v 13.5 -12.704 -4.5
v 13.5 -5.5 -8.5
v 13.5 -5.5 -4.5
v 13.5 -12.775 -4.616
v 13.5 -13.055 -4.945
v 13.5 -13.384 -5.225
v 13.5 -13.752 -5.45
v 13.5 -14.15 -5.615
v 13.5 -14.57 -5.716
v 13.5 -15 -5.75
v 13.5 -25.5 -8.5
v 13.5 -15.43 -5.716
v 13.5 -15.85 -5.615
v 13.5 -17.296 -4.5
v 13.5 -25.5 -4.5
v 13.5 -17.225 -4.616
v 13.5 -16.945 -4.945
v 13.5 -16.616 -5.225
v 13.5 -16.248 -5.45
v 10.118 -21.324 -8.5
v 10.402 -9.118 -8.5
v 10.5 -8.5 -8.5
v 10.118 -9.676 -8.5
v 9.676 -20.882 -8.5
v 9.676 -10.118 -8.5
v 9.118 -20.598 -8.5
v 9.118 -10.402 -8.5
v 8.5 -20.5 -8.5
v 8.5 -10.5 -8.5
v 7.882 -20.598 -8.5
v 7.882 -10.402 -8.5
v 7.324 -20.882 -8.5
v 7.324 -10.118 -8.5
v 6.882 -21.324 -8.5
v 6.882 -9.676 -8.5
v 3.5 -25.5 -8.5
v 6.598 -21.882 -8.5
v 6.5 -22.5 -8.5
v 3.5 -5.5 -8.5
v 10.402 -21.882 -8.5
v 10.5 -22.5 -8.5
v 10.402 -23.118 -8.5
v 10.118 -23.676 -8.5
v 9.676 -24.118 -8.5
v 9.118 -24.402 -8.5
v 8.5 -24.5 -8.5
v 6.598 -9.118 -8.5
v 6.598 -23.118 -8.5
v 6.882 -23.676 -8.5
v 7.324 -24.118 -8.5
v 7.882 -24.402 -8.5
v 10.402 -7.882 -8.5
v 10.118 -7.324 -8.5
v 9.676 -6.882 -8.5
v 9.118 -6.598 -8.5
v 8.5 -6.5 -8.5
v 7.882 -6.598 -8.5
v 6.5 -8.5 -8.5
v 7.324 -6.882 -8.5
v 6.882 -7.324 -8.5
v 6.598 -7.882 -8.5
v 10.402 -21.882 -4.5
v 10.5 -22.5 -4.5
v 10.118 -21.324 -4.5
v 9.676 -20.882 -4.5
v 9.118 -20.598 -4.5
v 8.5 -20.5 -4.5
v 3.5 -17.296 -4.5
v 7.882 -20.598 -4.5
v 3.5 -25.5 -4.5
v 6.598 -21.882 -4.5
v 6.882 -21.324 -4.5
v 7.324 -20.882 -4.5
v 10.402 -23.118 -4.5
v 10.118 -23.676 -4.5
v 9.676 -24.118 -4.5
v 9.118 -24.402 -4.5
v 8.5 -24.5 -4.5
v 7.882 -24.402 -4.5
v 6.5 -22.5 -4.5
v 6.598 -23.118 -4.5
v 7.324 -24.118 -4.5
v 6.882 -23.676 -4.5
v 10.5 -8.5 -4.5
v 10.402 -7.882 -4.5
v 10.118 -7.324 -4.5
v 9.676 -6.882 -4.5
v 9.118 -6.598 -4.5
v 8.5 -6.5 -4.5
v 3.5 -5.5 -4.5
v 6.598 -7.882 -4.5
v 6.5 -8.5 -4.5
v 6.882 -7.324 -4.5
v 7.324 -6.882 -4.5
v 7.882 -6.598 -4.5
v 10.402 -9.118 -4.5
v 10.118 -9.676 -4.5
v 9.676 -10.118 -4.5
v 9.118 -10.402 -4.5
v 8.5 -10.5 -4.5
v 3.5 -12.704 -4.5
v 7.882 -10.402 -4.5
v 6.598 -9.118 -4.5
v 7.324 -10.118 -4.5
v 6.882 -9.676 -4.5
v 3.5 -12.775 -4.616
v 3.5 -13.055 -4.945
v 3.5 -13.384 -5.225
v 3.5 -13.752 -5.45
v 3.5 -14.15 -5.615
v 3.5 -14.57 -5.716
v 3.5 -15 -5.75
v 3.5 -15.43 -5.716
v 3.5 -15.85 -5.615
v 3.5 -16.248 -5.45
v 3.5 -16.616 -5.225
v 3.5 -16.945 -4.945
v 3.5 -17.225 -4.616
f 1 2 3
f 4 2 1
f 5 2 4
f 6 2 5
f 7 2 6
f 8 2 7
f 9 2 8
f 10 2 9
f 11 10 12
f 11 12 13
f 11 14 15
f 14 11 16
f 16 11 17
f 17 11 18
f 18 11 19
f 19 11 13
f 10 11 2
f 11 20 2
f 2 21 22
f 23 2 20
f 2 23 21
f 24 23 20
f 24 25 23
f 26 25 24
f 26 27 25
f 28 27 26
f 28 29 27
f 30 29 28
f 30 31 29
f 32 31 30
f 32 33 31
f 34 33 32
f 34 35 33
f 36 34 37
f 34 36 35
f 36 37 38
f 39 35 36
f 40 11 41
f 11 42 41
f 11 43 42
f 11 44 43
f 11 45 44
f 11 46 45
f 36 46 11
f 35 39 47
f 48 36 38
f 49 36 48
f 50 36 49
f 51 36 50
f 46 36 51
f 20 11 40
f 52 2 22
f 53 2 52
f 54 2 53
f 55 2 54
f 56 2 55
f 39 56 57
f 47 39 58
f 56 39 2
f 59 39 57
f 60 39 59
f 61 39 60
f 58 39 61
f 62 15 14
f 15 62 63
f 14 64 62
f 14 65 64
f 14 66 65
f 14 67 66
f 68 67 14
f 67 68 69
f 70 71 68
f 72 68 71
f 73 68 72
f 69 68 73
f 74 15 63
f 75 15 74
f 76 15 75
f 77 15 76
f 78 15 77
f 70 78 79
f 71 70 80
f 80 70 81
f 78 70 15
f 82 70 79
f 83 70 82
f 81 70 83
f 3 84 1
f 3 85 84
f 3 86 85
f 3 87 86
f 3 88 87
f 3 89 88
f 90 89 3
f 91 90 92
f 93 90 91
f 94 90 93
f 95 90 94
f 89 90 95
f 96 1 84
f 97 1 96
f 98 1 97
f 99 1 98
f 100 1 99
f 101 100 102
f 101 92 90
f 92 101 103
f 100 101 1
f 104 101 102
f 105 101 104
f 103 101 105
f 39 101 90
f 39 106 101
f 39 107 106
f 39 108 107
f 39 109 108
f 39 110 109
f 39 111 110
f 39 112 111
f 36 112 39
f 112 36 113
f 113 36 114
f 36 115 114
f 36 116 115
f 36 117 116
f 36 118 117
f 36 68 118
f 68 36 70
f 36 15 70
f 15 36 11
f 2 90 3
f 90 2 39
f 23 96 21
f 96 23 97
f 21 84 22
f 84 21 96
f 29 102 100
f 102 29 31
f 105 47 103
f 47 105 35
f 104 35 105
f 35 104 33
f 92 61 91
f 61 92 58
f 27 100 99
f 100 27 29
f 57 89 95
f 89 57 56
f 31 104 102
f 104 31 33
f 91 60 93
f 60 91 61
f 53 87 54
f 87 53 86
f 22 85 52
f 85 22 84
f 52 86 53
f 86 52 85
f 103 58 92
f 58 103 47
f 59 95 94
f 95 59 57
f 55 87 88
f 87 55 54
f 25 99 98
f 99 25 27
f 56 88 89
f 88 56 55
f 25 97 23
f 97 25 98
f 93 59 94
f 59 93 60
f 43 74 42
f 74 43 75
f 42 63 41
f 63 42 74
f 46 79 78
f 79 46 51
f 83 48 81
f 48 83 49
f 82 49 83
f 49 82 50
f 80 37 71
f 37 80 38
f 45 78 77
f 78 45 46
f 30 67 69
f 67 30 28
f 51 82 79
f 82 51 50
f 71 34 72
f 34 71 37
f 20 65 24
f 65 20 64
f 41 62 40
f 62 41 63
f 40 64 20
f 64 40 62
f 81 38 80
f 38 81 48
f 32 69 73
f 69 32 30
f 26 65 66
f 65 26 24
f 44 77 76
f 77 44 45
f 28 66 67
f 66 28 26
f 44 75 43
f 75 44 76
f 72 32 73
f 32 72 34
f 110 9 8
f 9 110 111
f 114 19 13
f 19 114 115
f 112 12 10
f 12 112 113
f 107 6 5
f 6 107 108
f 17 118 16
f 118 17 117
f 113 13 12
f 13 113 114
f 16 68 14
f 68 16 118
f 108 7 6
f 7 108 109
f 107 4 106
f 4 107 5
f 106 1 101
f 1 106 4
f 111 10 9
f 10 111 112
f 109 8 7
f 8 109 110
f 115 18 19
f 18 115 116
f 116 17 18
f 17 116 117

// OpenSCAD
simple = true;
print = true;
Radius    = 10;
Wandung   = 2.5;
Tolleranz = -1.1;
Hoehe     = 15;
Breite    = 75;
Tiefe     = 30;
Versatz   = Wandung + Tolleranz;
Verschiebung = Wandung/2  ;
Snappos  = 4;
posx = 10;
$fn = 20;




 ViewCase();

module ViewCase()
{
  if (print)
  {
    // rotate([180,0,0]) Oberschale(); 
    rotate([180,0,0]) Kabelklemme();
     //Unterschale();
  }
  else
  {
    difference()
    {
      case();
       //translate([-10,-12,-10]) cube([300,14,100]);   // Schnitt A
       // translate([-20,-10,-10]) cube([45,450,100]);  // Schnitt B
      //translate([-10,-10,9]) cube([300,200,100]);   // Schnitt C 
    }
  }
}  

module case()
{
    Unterschale();
    translate([0,0 ,Snappos]) Oberschale();

}



module Oberschale()
{
  module Gehaeuse(size=[10,10,10])
  {
    aBreite = size[0];
    aTiefe = size[1];
    aSnappos = size[2];
    
    difference()
    {  
    linear_extrude(Hoehe-aSnappos) offset(r = Radius, $fn=40) square([aBreite+Versatz,aTiefe+Versatz]);
     
    translate([Wandung,Wandung,-Wandung]) linear_extrude(Hoehe-(aSnappos)) offset(r = Radius, $fn=20) square([aBreite+Tolleranz-Wandung,aTiefe+Tolleranz-Wandung]);  
      
    translate([Wandung,Wandung,0]) Snapin_B([aBreite+Tolleranz-Wandung,aTiefe+Tolleranz-Wandung,4.5], Feder = 0.8, Tolerance = 0.1, Offset = Radius, $fn=40);
    }
  }
  // translate([12.5,5.6,7.5]) cube([79,65.8,8]); 
   
    difference()
  {  
    union()
    {
      Gehaeuse([Breite, Tiefe, Snappos]);
      translate([Wandung+1,Wandung+posx-7,Wandung+2])  cube([10,20,4]);
    }
    translate([Wandung+6,Wandung+posx-4,Wandung+1])  cylinder(5,1,1);
    translate([Wandung+6,Wandung+posx+10,Wandung+1])  cylinder(5,1,1);
    translate([Verschiebung+Breite-Tiefe/2,Verschiebung+Tiefe/2,Wandung-4])  cylinder(16,3.5,3.5);
  
//  translate([Wandung+0.635*2,Wandung+0.635*1,Wandung+0]) color(    
//    "black") cube([2.54,5.08,7.4]); 
//  translate([Wandung+0.635*51,Wandung+0.635*-1,Wandung+0]) color("black") cube([5.08,2.54,7.4]); 
//  
//  translate([Wandung+0.635*72,Wandung+0.635*-1,Wandung+0]) color("black") cube([2.54,5.08,7.4]); 
//  
//  translate([Wandung+0.635*72,Wandung+0.635*7,Wandung+0]) color("black") cube([2.54,5.08,7.4]); 
//  
//  translate([Wandung+0.635*88,Wandung+0.635*26,Wandung+0]) color("black") cube([2.54,5.08,7.4]); 
//  
//  translate([Wandung+0.635*102,Wandung+0.635*1,Wandung+0]) color("black") cube([2.54,5.08,7.4]); 
// //CON
//  offs = 1.2;
//  translate([Wandung+0.635*94-offs/2,Wandung+0.635*9-offs/2,Wandung+3]) color("black") cube([2.54+offs,6*2.54+offs,7.4]); 
//  
// translate([Wandung+0.635*29,Wandung+0.635*-10,Wandung-2.5]) color("black") cube([0.635*14,5.08,5.5]); 
    
 translate([Wandung+12,Wandung+posx+2.5,Wandung+2]) color("silver") rotate([0,0,90]) Ausbruch(); 
// 
//// LED
// translate([Wandung+0.635*14,Wandung+0.635*7,Wandung+0]) color("black") cylinder(7.5,3,3, $fn=20);  
// 

  }
  
  
//
// Bolezenpos  = Hoehe - Snappos -Wandung ;
//  Bolzenhoehe = 7.8;
// translate([Versatz+5.5,Versatz+13,Bolezenpos-Bolzenhoehe])Podest(h = Bolzenhoehe, dir = 0); 
//
//translate([Versatz+24,Versatz+posx+3,2.2])Podest(h = 7.7, dir = 0);   
//  translate([Versatz+67,Versatz+6,2])Podest(h = 8, dir = 0);  
//
//   
}

module Unterschale()
{
    
  module Gehaeuse(size=[10,10,10])
  {
    aBreite = size[0];
    aTiefe = size[1];
    aSnappos = size[2];
    
    difference()
    {  
      linear_extrude(aSnappos)         offset(r = Radius, $fn=40) square([aBreite+  Versatz,aTiefe+Versatz]);
      translate([Wandung,Wandung,Wandung]) linear_extrude(aSnappos/*-Wandung*/)   offset(r = Radius, $fn=40) square([aBreite+Tolleranz-Wandung,aTiefe+Tolleranz-Wandung]);
    }
    translate([Wandung,Wandung,aSnappos]) Snapin_A([aBreite+Tolleranz-Wandung,aTiefe+Tolleranz-Wandung,4.5], Feder = 0.8, Tolerance = 0.1, Offset = Radius, $fn=40);  
    
  }
 // translate([0.47 + Versatz,-4.8 + Versatz,Wandung+1.9,]) boards();
  difference()
  {  
      union()
      {
        Gehaeuse([Breite, Tiefe, Snappos]);
        
        
        //translate([Versatz+15,Versatz+20,Wandung])Podest(h = 1.60, dir = 0); 
        
        //translate([Versatz+15,Versatz+7,Wandung])Podest(h = 1.60, dir = 0); 
        
        //translate([Versatz+57,Versatz+7,Wandung])Podest(h = 1.60, dir = 0);
        
        // translate([Versatz+53.6,Versatz+23,Wandung])Podest(h = 1.60, dir = 0);
      }
        

      
translate([Wandung+0,Wandung+posx+2.5,Wandung+4]) color("silver") rotate([0,0,90]) Ausbruch();


    
  }
 
}

module Kabelklemme()
{
    difference()
    {
    translate([Wandung+1,Wandung+posx-7,Wandung+2])  cube([10,20,4]);
    
    translate([Wandung+6,Wandung+posx-4,Wandung+1.5])  cylinder(5,2,2);
    translate([Wandung+6,Wandung+posx+10,Wandung+1.5])  cylinder(5,2,2);
      
       translate([Wandung+12,Wandung+posx+2.5,Wandung+0.5]) color("silver") rotate([0,0,90]) Ausbruch();

  }
}

module Ausbruch(d = 5.5)
{
  // cube([0.635*14,15.08,5.5]); 
  rotate([-90,00,0]) cylinder(30,d/2,d/2, $fn = 40); 
}

module Podest(h = 10, dir = 0)
{
  linear_extrude(h)  
  rotate(dir)  difference()
  {
    translate([-1.5,-1.5]) offset(2,$fn = 40) square(2.5, center = true);
    //circle(1.3,$fn = 10);  
  }
}    

module boards()
{
  translate([-1.4,posx,0]) 
  {
    lpsize = [36.5,18.4,1.49];
    LP1(lpsize);
    LpHalter([lpsize[0], lpsize[1], 5]);    
  }
  translate([55,4.3,0]) 
  {
    lp2size = [14,30.5,1.0];
    LP2(lp2size);
    LpHalter([lp2size[0], lp2size[1], 5]);
  }
}

module LP1(lpsize)
{
  if (!print)
  {  color("red") cube(lpsize);
    translate([-1,(18.4-7.7)/2,1.6]) color("silver") cube([9.3,7.7,3.84]);
    translate([20,(18.4-5.5)/2,1.6]) color("black") cube([10,5.5,2]);
  }  
}

module LP2(lpsize)
{
  if (!print)
  {
    color("green") cube(lpsize);
  }
}


module LpHalter(lpsize = [36.5,18.4,5])
{
  offset1 = 2;
  offset2 = 0.6;
  lpheight = 1.6;
  toleranz = 0.2;
  //color("red") cube([36.5,18.4,1.6]);
  
  difference()
  {
    translate([-offset1,-offset1,-lpsize[2]+lpheight])  cube([lpsize[0]+2*offset1, lpsize[1]+2*offset1, lpsize[2]-toleranz/2]);
    translate([-toleranz/2,-toleranz/2,-toleranz/2]) cube([lpsize[0]+toleranz, lpsize[1]+toleranz, lpsize[2]+2]);
    translate([+offset2/2,+offset2/2,-lpsize[2]+lpheight-0.2]) cube([lpsize[0]-offset2, lpsize[1]-offset2, lpsize[2]]);
    
    translate([+offset2/2-2*offset1,+lpsize[1]/4,-lpsize[2]+lpheight-0.2]) cube([lpsize[0]+4*offset1, lpsize[1]/2, lpsize[2]+1]);
    
     translate([+lpsize[0]/4,+offset2/2-2*offset1,-lpsize[2]+lpheight-0.2]) cube([ lpsize[0]/2, lpsize[1]+4*offset1, lpsize[2]+1]);
    
    translate([toleranz/2,toleranz/2,-toleranz/2]) cylinder(lpheight+toleranz,2*toleranz,2*toleranz,$fn = 20);
    translate([lpsize[0]-toleranz/2,+toleranz/2,-toleranz/2]) cylinder(lpheight+toleranz,2*toleranz,2*toleranz,$fn = 20);
    translate([-toleranz/2+lpsize[0],-toleranz/2+lpsize[1],-toleranz/2]) cylinder(lpheight+toleranz,2*toleranz,2*toleranz,$fn = 20);
    translate([+toleranz/2,-toleranz/2+lpsize[1],-toleranz/2]) cylinder(lpheight+toleranz,2*toleranz,2*toleranz,$fn = 20);
  }  
}




module SnapRoll(length = 5, r = 1, tolerance = -0.2) {
  translate([0,0,-length/2]) 
  union()
  {
    sphere(r=r+tolerance/2 , $fn = 20);
    translate([0,0,length]) sphere(r=r+tolerance/2 , $fn = 20);
    linear_extrude(length) { circle(r=r+tolerance/2 , $fn = 20); translate([ -(r+tolerance/2),tolerance]) square([2*r+tolerance,-tolerance]);
    }
  }
} 
   

module Snapin_A(Size = [30,10,4], Feder = 0.8, Tolerance = 0.1, Offset = 12) // Unnen
{

  Flaecheoeffnen = 0.1;
  union()
  {  
    difference()
    {  
      translate([-Feder,-Feder,-3*Feder]) linear_extrude(3*Feder) offset(r = Offset, $fn=40) square([Size[0]+2*Feder,Size[1]+2*Feder]);
      translate([Tolerance+Feder,Tolerance+Feder,-(2*Feder+Flaecheoeffnen)]) linear_extrude(2*Feder+2*Flaecheoeffnen) offset(r = Offset, $fn=40) square([Size[0]-2*(Tolerance+Feder),Size[1]-2*(Tolerance+Feder)]);
      translate([Size[0]/2,Size[1]/2,-(3*Feder+Flaecheoeffnen)]) 
    linear_extrude(1*Feder+1*Flaecheoeffnen, scale = [(Size[0]-2*Feder)/Size[0],(Size[1]-2*Feder)/Size[1]]) offset(r = Offset, $fn=40) square([Size[0],Size[1]], center=true);
    } 
    // Snap Spring 
    difference()
    {
      translate([Tolerance,Tolerance,0]) linear_extrude(Size[2]) offset(r = Offset, $fn=40) square([Size[0]-2*Tolerance,Size[1]-2*Tolerance]); 
       translate([Tolerance+Feder,Tolerance+Feder,-Flaecheoeffnen]) linear_extrude(Size[2]+2*Flaecheoeffnen) offset(r = Offset, $fn=40) square([Size[0]-2*(Tolerance+Feder),Size[1]-2*(Tolerance+Feder)]);  
    } 
    
    // Snap Rolls
    translate([Size[0]/2, - Offset , Size[2]-Feder+Tolerance/2]) 
     rotate([0, 90, 180]) SnapRoll(length = Size[0]/2, r = Feder, tolerance = - Tolerance );                 
    translate([Size[0]/2, Size[1] + Offset , Size[2]-Feder+Tolerance/2])
			rotate([0, 90, 0])  SnapRoll(length = Size[0]/2, r = Feder, tolerance = - Tolerance); 
    translate([- Offset , Size[1]/2 , Size[2]-Feder+Tolerance/2])
			rotate([-90, 90, 00])  SnapRoll(length =Size[1]/2, r = Feder, tolerance = - Tolerance);
    translate([Size[0] + Offset, Size[1]/2  , Size[2]-Feder+Tolerance/2])
			rotate([-90, -90, 00])    SnapRoll(length = Size[1]/2, r = Feder, tolerance = - Tolerance);
    
  }  
}  
 

module Snapin_B(Size = [10,10,10], Feder = 0.8, Tolerance = 0.1, Offset = 2)
{

    
  // Difference the Snapin_B for your Case
  Flaecheoeffnen = 0.1;
  union()
  {  
    difference()
    {
      translate([0,0,0]) linear_extrude(Size[2]) offset(r = Offset+Tolerance, $fn=40) square([Size[0],Size[1]]); 
       translate([-Tolerance+Feder,-Tolerance+Feder,-Flaecheoeffnen]) linear_extrude(Size[2]+2*Flaecheoeffnen) offset(r = Offset, $fn=40) square([Size[0]-2*(-Tolerance+Feder),Size[1]-2*(-Tolerance+Feder)]);  
    } 
    translate([Size[0]/2, - Offset , Size[2]-Feder+Tolerance/2])
    rotate([0,90,0])
        SnapRoll(length = 1.5+Size[0]/2, r = Feder, tolerance = Tolerance);
    translate([Size[0]/2, Size[1] + Offset , Size[2]-Feder+Tolerance/2])
    rotate([0,90,0])
			SnapRoll(length = 1.5+Size[0]/2, r = Feder, tolerance = Tolerance);
    
    translate([- Offset ,Size[1]/2 , Size[2]-Feder+Tolerance/2])
    rotate([90,0,0])
			SnapRoll(length = 1.5+Size[1]/2, r = Feder, tolerance = Tolerance);
    translate([Size[0] + Offset, Size[1]/2  , Size[2]-Feder+Tolerance/2])
    rotate([90,0,0])
			SnapRoll(length = 1.5+Size[1]/2, r = Feder, tolerance = Tolerance);
    
  }  
}    
